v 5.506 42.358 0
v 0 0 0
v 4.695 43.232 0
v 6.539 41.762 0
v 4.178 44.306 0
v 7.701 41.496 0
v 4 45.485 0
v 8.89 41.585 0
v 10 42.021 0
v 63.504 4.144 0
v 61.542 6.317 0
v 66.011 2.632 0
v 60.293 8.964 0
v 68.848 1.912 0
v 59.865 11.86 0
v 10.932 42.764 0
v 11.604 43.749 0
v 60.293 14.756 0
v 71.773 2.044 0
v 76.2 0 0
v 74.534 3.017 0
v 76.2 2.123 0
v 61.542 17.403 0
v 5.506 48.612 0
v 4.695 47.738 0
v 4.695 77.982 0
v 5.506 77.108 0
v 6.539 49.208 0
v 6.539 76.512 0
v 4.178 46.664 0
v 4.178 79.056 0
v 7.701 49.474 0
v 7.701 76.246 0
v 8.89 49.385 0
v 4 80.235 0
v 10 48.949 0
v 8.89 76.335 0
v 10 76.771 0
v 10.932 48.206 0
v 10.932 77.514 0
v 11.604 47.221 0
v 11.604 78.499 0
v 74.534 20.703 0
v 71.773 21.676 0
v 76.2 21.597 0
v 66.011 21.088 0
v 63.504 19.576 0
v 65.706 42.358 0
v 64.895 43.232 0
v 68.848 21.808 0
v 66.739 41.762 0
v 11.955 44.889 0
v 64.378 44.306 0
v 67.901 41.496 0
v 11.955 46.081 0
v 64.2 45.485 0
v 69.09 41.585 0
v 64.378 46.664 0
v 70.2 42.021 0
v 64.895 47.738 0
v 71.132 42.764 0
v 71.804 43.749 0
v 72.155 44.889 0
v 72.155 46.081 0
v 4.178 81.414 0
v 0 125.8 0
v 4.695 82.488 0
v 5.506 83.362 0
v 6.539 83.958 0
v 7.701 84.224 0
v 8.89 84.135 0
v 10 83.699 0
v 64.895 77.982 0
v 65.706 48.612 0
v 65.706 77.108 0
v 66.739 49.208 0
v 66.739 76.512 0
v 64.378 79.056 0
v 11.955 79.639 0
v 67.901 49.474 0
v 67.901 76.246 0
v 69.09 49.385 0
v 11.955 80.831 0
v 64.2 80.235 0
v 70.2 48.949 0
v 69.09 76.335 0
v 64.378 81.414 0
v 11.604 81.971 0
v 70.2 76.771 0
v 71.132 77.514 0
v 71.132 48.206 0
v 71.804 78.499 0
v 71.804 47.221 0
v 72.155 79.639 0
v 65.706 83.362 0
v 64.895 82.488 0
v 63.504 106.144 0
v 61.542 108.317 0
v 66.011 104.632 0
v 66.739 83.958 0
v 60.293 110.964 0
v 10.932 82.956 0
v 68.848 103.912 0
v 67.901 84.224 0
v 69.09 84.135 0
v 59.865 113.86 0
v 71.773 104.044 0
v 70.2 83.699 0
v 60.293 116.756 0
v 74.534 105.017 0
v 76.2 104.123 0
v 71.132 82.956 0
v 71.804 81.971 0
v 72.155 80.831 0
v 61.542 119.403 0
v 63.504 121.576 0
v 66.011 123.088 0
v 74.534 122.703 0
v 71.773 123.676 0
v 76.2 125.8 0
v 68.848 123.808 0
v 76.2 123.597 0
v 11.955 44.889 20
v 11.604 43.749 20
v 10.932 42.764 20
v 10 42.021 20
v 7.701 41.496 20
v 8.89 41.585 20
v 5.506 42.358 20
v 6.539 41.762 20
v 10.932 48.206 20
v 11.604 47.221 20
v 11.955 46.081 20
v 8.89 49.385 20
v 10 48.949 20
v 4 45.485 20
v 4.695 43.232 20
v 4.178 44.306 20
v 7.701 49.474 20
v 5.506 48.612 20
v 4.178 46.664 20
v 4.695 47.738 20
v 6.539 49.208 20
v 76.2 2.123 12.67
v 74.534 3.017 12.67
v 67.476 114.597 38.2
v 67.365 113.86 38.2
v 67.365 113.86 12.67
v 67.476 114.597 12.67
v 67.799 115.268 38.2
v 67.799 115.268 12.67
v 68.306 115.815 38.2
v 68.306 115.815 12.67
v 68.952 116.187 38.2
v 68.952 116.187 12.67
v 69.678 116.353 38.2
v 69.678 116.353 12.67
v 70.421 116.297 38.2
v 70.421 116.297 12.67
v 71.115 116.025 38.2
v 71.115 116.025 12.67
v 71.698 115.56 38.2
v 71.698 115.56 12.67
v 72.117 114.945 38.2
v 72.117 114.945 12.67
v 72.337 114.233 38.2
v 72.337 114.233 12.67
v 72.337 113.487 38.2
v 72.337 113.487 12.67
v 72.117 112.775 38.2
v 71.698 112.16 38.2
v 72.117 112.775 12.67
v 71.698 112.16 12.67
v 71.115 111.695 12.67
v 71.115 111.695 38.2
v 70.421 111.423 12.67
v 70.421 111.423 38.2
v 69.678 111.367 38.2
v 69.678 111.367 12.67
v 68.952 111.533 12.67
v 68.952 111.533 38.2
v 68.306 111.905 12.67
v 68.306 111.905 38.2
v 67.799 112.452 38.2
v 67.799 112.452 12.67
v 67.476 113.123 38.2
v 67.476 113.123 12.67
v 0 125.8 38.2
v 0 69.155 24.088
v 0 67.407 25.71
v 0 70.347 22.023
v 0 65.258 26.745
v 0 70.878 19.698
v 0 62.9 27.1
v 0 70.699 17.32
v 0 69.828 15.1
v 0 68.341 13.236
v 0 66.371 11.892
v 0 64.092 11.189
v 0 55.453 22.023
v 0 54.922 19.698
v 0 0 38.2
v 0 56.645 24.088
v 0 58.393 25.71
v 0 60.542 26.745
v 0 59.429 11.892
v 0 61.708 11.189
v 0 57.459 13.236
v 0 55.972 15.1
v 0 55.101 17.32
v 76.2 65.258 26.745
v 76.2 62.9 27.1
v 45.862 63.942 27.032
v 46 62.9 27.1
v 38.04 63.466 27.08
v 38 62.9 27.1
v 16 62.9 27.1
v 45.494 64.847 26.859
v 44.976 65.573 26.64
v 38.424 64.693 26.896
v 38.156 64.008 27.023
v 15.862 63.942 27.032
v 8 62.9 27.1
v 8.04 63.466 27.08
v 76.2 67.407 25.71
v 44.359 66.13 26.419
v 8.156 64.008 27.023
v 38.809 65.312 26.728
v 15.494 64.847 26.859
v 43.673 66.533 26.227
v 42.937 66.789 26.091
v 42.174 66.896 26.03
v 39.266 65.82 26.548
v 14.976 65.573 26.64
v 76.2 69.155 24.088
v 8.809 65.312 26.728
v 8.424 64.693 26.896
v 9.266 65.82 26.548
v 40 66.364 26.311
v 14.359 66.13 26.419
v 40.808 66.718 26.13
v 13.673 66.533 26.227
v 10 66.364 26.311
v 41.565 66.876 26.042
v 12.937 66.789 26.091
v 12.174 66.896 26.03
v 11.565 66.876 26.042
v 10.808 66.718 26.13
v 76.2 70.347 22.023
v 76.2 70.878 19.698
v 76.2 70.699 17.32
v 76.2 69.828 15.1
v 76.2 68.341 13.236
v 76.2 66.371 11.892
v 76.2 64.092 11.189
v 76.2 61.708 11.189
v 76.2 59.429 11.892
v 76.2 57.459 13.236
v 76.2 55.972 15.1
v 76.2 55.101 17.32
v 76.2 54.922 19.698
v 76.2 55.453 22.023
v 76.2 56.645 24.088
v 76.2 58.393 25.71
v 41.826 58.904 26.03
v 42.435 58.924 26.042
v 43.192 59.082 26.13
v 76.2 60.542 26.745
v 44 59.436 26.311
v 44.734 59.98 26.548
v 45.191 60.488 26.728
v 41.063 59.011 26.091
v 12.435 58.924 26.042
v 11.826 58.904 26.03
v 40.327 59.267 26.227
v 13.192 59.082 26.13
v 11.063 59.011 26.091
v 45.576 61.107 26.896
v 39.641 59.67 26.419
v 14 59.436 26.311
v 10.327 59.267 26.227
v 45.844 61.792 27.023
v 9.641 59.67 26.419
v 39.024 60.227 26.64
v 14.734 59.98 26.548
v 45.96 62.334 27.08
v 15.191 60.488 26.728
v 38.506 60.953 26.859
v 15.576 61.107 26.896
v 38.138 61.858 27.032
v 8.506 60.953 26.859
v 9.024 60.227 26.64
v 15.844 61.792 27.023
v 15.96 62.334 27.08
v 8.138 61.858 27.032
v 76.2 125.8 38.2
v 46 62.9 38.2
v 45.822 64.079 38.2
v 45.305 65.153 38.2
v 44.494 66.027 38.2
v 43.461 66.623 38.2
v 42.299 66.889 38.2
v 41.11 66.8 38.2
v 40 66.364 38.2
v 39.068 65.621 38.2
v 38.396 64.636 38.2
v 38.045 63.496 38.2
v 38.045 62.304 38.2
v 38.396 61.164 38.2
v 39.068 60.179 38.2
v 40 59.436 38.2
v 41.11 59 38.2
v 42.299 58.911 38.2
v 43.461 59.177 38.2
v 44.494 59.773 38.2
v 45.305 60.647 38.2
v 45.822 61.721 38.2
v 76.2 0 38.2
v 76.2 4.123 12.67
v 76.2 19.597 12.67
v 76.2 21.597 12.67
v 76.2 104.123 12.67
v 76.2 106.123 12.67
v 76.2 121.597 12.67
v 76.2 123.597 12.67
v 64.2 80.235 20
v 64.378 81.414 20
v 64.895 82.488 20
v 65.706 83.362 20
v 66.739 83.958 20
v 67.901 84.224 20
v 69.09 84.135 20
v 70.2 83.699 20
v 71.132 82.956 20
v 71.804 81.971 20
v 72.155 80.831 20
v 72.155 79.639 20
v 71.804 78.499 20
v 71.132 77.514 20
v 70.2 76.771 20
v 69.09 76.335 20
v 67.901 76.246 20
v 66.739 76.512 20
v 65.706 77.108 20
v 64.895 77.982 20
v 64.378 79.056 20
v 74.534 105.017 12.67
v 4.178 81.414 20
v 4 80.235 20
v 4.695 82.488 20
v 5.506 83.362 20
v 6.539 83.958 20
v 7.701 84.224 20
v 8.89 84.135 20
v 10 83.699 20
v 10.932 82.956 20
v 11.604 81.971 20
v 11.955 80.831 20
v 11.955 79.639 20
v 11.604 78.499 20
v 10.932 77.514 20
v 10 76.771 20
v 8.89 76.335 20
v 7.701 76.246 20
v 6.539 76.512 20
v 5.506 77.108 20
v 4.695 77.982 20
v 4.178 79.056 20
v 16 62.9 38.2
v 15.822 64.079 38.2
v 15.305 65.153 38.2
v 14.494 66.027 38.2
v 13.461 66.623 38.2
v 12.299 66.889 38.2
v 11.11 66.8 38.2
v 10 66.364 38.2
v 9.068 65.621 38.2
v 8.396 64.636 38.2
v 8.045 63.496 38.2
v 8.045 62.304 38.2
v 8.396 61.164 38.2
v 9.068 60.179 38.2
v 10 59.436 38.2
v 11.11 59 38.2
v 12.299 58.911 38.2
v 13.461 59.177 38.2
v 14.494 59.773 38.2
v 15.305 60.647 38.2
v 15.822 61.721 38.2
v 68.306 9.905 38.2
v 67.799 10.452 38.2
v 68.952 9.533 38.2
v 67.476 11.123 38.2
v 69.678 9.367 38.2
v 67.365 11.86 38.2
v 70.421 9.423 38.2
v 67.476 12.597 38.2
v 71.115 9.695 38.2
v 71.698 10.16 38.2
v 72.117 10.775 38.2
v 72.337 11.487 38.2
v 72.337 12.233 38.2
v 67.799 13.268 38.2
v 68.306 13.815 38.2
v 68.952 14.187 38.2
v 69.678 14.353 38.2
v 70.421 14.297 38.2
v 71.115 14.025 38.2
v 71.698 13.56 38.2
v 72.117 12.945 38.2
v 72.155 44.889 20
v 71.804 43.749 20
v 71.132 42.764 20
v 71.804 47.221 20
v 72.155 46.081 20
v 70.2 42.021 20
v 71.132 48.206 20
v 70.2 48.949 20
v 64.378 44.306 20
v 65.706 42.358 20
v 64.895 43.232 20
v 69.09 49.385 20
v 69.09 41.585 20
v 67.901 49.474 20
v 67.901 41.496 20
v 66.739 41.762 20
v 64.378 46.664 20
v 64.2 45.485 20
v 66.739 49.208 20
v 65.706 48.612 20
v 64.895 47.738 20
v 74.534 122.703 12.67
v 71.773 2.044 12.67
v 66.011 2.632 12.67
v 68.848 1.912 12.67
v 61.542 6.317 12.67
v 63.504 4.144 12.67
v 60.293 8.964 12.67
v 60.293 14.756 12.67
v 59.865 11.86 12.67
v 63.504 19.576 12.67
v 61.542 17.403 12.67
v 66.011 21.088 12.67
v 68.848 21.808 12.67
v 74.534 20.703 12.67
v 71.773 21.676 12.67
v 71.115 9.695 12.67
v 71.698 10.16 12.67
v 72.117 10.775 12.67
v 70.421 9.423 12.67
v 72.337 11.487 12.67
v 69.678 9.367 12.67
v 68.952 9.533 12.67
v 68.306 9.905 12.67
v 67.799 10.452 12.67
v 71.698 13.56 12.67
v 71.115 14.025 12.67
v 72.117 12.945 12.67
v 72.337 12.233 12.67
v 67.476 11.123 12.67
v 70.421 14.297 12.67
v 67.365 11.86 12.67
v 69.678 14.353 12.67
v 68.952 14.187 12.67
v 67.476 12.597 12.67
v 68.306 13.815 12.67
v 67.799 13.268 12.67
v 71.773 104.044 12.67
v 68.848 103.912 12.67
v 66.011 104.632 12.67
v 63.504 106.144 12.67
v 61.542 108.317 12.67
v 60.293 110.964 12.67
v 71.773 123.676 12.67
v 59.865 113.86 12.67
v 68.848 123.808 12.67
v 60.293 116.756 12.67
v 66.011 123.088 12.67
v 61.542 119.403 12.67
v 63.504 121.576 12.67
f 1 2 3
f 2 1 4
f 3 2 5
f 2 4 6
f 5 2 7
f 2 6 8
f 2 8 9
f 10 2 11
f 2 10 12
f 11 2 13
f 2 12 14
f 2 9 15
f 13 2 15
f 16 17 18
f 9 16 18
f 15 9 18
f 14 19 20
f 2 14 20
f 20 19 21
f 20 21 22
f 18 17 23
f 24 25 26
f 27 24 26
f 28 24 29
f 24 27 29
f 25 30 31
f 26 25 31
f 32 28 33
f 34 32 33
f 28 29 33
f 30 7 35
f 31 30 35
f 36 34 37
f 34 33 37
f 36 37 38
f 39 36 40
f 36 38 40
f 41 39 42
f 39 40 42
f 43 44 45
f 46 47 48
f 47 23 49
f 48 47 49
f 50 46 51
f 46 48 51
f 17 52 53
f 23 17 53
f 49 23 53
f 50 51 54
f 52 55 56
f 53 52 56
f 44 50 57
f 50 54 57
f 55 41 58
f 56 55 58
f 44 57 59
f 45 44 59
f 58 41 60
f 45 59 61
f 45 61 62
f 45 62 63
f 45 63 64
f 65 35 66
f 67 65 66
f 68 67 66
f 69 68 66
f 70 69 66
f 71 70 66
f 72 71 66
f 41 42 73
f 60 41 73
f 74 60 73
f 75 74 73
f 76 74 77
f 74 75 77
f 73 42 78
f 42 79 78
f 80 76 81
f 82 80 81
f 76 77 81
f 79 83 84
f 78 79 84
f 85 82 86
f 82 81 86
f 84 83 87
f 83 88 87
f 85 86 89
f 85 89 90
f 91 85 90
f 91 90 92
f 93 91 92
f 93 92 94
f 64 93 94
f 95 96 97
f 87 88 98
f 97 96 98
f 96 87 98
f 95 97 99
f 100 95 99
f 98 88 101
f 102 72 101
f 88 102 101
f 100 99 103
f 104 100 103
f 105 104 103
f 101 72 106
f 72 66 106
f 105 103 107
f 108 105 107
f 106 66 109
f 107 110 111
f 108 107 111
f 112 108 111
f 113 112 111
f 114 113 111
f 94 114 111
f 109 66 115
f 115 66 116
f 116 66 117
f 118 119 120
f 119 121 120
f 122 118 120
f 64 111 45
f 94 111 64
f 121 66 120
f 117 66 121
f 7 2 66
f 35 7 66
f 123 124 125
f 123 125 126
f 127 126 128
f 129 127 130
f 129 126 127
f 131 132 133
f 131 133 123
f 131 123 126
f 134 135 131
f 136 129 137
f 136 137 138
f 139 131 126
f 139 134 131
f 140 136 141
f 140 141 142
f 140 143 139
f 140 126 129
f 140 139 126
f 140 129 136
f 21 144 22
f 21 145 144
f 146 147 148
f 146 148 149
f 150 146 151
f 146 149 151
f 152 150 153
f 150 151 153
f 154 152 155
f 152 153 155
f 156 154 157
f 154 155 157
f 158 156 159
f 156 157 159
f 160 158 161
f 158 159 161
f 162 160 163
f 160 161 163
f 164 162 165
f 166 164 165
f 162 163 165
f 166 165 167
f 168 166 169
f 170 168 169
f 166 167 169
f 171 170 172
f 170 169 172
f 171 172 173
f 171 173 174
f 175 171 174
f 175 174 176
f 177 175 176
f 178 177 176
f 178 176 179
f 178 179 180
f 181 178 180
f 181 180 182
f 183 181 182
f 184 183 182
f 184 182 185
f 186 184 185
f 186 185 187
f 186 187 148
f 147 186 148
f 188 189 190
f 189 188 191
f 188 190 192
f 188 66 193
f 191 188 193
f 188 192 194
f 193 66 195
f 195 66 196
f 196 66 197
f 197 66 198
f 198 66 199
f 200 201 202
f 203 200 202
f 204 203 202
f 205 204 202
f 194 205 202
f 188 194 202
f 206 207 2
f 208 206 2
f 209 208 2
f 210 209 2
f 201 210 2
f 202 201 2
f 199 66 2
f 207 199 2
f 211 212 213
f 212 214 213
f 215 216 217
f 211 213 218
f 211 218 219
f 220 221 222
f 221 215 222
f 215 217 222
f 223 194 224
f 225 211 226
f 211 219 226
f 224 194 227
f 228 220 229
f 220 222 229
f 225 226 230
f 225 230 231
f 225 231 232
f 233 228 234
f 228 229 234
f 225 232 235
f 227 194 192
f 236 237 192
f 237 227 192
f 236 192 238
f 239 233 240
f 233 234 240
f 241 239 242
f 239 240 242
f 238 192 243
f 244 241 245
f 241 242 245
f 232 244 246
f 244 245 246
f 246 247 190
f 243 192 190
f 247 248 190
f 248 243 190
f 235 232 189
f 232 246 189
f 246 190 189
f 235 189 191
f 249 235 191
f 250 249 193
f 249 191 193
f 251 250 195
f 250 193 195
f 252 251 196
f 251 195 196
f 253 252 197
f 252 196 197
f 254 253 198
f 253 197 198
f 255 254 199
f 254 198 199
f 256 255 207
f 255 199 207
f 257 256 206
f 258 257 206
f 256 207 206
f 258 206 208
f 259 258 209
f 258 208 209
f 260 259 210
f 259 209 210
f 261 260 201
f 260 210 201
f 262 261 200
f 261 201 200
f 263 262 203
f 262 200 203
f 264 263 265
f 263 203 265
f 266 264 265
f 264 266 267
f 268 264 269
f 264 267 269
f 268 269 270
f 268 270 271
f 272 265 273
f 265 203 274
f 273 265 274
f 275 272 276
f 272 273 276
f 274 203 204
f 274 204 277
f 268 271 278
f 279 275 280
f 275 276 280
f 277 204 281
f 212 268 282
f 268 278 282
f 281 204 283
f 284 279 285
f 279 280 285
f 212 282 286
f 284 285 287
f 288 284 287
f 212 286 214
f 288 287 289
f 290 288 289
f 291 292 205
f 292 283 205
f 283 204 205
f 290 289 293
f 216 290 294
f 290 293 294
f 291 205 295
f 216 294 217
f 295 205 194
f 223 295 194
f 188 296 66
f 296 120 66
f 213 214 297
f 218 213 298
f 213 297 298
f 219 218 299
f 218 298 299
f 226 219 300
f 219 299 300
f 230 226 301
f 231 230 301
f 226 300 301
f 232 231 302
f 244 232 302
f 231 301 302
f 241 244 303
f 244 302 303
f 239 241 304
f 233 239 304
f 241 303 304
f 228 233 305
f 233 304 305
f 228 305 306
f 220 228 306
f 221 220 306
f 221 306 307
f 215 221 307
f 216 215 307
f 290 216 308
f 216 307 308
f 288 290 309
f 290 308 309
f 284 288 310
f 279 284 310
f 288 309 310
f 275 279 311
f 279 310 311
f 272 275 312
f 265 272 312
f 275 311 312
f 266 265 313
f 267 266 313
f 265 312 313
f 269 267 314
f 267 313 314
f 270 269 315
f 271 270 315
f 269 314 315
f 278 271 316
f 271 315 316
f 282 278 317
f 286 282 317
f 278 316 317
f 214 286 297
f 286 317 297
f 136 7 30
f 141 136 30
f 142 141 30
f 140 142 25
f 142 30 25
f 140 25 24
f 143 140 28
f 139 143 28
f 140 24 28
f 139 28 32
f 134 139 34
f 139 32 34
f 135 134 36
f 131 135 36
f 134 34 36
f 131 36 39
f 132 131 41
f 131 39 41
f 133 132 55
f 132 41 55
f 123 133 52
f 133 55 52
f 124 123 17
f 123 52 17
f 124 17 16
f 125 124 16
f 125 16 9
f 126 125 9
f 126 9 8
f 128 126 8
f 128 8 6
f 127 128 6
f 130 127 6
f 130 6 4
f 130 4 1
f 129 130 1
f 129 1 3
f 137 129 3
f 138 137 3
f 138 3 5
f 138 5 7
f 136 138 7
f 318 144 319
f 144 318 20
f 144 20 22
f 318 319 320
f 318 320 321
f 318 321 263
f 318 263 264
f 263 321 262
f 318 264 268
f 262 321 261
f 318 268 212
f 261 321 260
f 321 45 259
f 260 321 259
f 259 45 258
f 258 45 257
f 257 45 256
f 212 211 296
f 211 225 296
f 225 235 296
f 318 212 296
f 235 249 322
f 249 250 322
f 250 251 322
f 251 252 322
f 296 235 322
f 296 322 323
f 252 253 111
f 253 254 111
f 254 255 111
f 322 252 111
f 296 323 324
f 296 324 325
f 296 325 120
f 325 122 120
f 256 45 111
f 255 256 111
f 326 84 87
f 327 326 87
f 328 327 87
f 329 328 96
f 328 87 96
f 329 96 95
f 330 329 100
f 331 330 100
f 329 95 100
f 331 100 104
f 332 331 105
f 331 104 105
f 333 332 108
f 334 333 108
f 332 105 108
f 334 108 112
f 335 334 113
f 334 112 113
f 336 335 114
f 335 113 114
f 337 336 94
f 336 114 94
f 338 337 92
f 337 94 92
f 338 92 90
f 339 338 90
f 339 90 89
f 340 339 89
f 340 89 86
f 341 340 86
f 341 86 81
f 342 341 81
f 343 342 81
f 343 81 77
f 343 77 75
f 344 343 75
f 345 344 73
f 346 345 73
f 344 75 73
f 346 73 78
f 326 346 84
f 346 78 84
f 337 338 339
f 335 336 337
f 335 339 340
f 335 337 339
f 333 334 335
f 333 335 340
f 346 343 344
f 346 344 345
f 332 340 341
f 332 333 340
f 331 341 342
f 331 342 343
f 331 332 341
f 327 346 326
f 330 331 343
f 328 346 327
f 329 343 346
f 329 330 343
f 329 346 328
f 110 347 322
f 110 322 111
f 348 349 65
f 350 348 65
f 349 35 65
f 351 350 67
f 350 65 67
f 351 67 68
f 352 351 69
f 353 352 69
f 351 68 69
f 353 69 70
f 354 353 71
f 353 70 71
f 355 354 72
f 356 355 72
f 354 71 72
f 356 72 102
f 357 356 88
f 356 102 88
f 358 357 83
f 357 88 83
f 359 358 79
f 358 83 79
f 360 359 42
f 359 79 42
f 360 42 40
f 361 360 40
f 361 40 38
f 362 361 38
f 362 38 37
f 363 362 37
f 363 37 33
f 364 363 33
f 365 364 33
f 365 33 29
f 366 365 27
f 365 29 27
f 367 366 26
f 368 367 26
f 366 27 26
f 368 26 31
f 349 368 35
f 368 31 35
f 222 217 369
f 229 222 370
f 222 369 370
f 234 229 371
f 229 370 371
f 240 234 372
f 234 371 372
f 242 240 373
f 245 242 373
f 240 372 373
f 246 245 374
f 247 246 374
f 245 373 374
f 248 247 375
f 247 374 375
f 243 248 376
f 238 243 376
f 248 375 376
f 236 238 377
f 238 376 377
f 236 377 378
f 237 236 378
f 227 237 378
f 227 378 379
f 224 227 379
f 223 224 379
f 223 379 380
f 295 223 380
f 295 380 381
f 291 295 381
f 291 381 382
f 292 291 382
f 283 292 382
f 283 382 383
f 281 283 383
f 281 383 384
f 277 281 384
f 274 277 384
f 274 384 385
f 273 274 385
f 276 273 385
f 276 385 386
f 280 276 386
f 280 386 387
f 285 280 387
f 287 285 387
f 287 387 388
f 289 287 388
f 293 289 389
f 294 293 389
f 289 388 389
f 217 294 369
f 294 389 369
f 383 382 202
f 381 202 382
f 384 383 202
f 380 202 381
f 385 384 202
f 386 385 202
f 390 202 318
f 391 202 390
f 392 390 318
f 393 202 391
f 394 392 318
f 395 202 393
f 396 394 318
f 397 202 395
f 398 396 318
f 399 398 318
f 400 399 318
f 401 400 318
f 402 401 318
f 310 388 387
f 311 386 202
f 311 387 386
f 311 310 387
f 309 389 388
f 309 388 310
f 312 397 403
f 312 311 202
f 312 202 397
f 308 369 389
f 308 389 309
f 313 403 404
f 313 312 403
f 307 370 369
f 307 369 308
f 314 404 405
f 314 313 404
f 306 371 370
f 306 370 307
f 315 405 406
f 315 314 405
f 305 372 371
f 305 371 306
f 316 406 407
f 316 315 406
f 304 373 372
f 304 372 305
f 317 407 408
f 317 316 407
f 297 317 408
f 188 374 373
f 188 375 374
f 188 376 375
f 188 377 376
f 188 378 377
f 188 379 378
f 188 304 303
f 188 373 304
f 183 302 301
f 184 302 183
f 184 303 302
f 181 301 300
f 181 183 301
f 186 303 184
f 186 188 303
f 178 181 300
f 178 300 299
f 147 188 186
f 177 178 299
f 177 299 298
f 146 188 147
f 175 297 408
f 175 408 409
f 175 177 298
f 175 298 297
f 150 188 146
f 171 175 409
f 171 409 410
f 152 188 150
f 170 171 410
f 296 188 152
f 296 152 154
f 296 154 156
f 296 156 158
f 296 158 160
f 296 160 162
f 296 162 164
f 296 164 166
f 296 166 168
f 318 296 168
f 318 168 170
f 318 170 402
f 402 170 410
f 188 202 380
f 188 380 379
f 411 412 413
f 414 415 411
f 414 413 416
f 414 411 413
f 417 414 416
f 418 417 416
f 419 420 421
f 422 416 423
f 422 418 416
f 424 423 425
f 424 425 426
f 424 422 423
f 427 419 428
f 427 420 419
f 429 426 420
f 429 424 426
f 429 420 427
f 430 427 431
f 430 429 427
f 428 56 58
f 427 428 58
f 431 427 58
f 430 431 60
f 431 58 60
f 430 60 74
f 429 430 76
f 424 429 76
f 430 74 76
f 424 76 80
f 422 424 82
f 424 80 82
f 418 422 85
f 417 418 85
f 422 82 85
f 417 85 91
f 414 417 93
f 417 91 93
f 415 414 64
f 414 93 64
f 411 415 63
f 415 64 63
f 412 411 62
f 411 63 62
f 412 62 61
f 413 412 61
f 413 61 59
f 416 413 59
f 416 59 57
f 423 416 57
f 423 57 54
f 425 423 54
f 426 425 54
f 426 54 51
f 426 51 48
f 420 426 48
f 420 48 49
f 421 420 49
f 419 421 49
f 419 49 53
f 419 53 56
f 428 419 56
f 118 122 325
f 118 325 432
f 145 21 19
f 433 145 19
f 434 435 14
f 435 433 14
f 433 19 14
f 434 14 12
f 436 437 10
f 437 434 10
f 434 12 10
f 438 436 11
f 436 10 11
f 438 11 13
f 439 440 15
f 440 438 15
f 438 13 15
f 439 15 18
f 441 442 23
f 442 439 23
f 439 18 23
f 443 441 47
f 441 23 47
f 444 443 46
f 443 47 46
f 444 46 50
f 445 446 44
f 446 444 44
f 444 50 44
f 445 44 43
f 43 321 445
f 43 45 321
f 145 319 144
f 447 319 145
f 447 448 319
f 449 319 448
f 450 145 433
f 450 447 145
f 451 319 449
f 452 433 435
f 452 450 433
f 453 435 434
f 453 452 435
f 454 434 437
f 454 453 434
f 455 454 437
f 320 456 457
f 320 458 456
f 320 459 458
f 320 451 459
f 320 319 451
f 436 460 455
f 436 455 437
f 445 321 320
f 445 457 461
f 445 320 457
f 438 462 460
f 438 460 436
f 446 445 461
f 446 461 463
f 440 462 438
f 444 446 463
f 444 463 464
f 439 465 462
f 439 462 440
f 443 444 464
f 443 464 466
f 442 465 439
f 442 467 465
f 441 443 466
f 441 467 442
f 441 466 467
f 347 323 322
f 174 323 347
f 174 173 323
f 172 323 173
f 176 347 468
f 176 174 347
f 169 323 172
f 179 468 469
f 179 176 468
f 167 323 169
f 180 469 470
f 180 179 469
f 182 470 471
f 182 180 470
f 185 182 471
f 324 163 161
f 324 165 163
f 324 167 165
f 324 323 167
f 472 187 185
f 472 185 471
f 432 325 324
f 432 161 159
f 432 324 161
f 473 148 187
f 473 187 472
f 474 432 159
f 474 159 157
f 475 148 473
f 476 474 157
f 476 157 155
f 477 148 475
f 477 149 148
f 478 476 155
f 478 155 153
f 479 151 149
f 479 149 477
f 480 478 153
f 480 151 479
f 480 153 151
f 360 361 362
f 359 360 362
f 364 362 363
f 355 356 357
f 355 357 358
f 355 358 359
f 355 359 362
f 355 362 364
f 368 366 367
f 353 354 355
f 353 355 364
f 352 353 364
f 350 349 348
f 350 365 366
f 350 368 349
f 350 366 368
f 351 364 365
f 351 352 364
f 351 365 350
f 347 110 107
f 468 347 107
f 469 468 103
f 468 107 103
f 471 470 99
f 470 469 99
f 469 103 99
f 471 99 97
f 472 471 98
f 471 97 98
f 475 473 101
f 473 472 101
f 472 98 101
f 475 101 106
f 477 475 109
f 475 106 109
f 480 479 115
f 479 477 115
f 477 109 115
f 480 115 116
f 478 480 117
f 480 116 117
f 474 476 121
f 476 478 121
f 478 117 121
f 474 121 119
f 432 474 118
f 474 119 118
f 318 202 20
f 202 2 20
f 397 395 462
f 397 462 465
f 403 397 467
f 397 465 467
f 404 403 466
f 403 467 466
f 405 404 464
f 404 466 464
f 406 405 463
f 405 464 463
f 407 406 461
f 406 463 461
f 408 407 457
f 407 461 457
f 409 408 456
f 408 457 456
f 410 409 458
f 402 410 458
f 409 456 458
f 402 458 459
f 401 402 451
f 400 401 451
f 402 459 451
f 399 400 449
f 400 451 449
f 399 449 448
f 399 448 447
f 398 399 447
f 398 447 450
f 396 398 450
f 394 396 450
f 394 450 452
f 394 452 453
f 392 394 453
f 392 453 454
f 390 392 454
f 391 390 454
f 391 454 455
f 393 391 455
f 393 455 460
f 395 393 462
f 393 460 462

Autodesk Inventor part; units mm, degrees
ref_plane "YZ Plane" through (0, 0, 0) normal (1, 0, 0) x (0, 1, 0)
ref_plane "XZ Plane" through (0, 0, 0) normal (0, 1, 0) x (-1, 0, 0)
ref_plane "XY Plane" through (0, 0, 0) normal (0, 0, 1) x (1, 0, 0)
sketch "Sketch1" plane through (0, 0, 0) normal (0, 0, 1) x (1, 0, 0)
  line L0 (0, 0) -> (76.2, 0)
  line L1 (76.2, 0) -> (76.2, 125.8)
  line L2 (76.2, 125.8) -> (0, 125.8)
  line L3 (0, 125.8) -> (0, 0)
  circle A0 centre (12, 62.9) radius 4
  circle A1 centre (42, 62.9) radius 4
  dimension "d0" = 76.2
  dimension "d1" = 125.8
  dimension "d2" = 8
  dimension "d3" = 8
  dimension "d4" = 12
  dimension "d5" = 42
  dimension "d6" = 62.9
  dimension "d7" = 62.9
extrude "Extrusion1" add sketch "Sketch1" along normal blind 38.2 contours L3 L2 L1 L0 | A0 | A1
sketch "Sketch2" plane through (0, 0, 38.2) normal (0, 0, 1) x (1, 0, 0)
  line L0 (0, 0) -> (76.2, 0)
  line L1 (76.2, 0) -> (76.2, 125.8)
  line L2 (76.2, 125.8) -> (0, 125.8)
  line L3 (0, 125.8) -> (0, 0)
  circle A0 centre (12, 62.9) radius 4
  circle A1 centre (42, 62.9) radius 4
  dimension "d17" = 76.2
  dimension "d16" = 125.8
  dimension "d13" = 8
  dimension "d10" = 8
  dimension "d15" = 12
  dimension "d12" = 42
  dimension "d11" = 62.9
  dimension "d14" = 62.9
extrude "Extrusion2" cut sketch "Sketch2" against normal blind 19.1 contours A0 | A1
sketch "Sketch3" plane through (0, 0, 0) normal (-1, 0, 0) x (0, 0, 1)
  circle A0 centre (19.1, 62.9) radius 8
  line L0 (38.2, 125.8) -> (38.2, 0) projected
  line L1 (0, 0) -> (38.2, 0) projected
  dimension "d21" = 16
  dimension "d22" = 19.1
  dimension "d23" = 62.9
extrude "Extrusion3" cut sketch "Sketch3" against normal up to next
thread "Thread1" size "M8x1.25" class "6H" standard "ANSI Metric M Profile" full length
thread "Thread2" size "M8x1.25" class "6H" standard "ANSI Metric M Profile" full length
sketch "Sketch7" plane through (76.2, 107.525, 0) normal (0, 0, -1) x (-1, 0, 0)
  circle A0 centre (6.335, -95.665) radius 2.5
  circle A1 centre (6.335, 6.335) radius 2.5
  line L0 (0, -89.33) -> (76.2, -89.33) projected
  line L1 (0, -107.525) -> (0, 18.275) projected
  line L2 (0, 18.275) -> (76.2, 18.275) projected
  point P0 (76.2, -107.525)
  dimension "d92" = 5
  dimension "d93" = 5
  dimension "d104" = 102
  dimension "d129" = 6.335
  dimension "d130" = 11.94
  dimension "d131" = 6.335
extrude "Extrusion7" cut sketch "Sketch7" against normal up to next
thread "Thread11" size "M5x0.8" class "6H" standard "ANSI Metric M Profile" full length
thread "Thread12" size "M5x0.8" class "6H" standard "ANSI Metric M Profile" full length
sketch "Sketch8" plane through (0, 0, 0) normal (0, 0, -1) x (-1, 0, 0)
  circle A0 centre (-8, 45.485) radius 4
  circle A1 centre (-8, 80.235) radius 4
  circle A2 centre (-68.2, 45.485) radius 4
  circle A3 centre (-68.2, 80.235) radius 4
  line L0 (0, 125.8) -> (0, 0) projected
  line L1 (-76.2, 0) -> (-76.2, 125.8) projected
  line L2 (-76.2, 18.195) -> (0, 18.195) projected
  line L3 (0, 107.525) -> (-76.2, 107.525) projected
  dimension "d106" = 8
  dimension "d107" = 8
  dimension "d108" = 8
  dimension "d109" = 8
  dimension "d110" = 8
  dimension "d111" = 8
  dimension "d112" = 8
  dimension "d113" = 8
  dimension "d114" = 34.75
  dimension "d115" = 34.75
  dimension "d116" = 27.29
  dimension "d117" = 27.29
  dimension "d118" = 89.33
extrude "Extrusion8" cut sketch "Sketch8" against normal blind 20 contours A0 | A1 | A2 | A3
thread "Thread13" size "M8x1.25" class "6H" standard "ANSI Metric M Profile" full length
thread "Thread14" size "M8x1.25" class "6H" standard "ANSI Metric M Profile" full length
thread "Thread15" size "M8x1.25" class "6H" standard "ANSI Metric M Profile" full length
thread "Thread16" size "M8x1.25" class "6H" standard "ANSI Metric M Profile" full length
sketch "Sketch9" plane through (0, 0, 0) normal (0, 0, -1) x (-1, 0, 0)
  circle A0 centre (-69.865, 113.86) radius 10
  circle A1 centre (-69.865, 11.86) radius 10
  circle A2 centre (-69.865, 113.86) radius 2.5 projected
  circle A3 centre (-69.865, 11.86) radius 2.5 projected
  point P0 (0, 0)
  dimension "d132" = 20
  dimension "d133" = 20
extrude "Extrusion9" cut sketch "Sketch9" against normal blind 12.67
chamfer "Chamfer2" distance 2 angle 45 4 edges at (76.2, 106.1226, 6.335) (76.2, 121.5974, 6.335) (76.2, 4.1226, 6.335) (76.2, 19.5974, 6.335)
properties part number "MotorMountLeft" material "Aluminum 6061"
